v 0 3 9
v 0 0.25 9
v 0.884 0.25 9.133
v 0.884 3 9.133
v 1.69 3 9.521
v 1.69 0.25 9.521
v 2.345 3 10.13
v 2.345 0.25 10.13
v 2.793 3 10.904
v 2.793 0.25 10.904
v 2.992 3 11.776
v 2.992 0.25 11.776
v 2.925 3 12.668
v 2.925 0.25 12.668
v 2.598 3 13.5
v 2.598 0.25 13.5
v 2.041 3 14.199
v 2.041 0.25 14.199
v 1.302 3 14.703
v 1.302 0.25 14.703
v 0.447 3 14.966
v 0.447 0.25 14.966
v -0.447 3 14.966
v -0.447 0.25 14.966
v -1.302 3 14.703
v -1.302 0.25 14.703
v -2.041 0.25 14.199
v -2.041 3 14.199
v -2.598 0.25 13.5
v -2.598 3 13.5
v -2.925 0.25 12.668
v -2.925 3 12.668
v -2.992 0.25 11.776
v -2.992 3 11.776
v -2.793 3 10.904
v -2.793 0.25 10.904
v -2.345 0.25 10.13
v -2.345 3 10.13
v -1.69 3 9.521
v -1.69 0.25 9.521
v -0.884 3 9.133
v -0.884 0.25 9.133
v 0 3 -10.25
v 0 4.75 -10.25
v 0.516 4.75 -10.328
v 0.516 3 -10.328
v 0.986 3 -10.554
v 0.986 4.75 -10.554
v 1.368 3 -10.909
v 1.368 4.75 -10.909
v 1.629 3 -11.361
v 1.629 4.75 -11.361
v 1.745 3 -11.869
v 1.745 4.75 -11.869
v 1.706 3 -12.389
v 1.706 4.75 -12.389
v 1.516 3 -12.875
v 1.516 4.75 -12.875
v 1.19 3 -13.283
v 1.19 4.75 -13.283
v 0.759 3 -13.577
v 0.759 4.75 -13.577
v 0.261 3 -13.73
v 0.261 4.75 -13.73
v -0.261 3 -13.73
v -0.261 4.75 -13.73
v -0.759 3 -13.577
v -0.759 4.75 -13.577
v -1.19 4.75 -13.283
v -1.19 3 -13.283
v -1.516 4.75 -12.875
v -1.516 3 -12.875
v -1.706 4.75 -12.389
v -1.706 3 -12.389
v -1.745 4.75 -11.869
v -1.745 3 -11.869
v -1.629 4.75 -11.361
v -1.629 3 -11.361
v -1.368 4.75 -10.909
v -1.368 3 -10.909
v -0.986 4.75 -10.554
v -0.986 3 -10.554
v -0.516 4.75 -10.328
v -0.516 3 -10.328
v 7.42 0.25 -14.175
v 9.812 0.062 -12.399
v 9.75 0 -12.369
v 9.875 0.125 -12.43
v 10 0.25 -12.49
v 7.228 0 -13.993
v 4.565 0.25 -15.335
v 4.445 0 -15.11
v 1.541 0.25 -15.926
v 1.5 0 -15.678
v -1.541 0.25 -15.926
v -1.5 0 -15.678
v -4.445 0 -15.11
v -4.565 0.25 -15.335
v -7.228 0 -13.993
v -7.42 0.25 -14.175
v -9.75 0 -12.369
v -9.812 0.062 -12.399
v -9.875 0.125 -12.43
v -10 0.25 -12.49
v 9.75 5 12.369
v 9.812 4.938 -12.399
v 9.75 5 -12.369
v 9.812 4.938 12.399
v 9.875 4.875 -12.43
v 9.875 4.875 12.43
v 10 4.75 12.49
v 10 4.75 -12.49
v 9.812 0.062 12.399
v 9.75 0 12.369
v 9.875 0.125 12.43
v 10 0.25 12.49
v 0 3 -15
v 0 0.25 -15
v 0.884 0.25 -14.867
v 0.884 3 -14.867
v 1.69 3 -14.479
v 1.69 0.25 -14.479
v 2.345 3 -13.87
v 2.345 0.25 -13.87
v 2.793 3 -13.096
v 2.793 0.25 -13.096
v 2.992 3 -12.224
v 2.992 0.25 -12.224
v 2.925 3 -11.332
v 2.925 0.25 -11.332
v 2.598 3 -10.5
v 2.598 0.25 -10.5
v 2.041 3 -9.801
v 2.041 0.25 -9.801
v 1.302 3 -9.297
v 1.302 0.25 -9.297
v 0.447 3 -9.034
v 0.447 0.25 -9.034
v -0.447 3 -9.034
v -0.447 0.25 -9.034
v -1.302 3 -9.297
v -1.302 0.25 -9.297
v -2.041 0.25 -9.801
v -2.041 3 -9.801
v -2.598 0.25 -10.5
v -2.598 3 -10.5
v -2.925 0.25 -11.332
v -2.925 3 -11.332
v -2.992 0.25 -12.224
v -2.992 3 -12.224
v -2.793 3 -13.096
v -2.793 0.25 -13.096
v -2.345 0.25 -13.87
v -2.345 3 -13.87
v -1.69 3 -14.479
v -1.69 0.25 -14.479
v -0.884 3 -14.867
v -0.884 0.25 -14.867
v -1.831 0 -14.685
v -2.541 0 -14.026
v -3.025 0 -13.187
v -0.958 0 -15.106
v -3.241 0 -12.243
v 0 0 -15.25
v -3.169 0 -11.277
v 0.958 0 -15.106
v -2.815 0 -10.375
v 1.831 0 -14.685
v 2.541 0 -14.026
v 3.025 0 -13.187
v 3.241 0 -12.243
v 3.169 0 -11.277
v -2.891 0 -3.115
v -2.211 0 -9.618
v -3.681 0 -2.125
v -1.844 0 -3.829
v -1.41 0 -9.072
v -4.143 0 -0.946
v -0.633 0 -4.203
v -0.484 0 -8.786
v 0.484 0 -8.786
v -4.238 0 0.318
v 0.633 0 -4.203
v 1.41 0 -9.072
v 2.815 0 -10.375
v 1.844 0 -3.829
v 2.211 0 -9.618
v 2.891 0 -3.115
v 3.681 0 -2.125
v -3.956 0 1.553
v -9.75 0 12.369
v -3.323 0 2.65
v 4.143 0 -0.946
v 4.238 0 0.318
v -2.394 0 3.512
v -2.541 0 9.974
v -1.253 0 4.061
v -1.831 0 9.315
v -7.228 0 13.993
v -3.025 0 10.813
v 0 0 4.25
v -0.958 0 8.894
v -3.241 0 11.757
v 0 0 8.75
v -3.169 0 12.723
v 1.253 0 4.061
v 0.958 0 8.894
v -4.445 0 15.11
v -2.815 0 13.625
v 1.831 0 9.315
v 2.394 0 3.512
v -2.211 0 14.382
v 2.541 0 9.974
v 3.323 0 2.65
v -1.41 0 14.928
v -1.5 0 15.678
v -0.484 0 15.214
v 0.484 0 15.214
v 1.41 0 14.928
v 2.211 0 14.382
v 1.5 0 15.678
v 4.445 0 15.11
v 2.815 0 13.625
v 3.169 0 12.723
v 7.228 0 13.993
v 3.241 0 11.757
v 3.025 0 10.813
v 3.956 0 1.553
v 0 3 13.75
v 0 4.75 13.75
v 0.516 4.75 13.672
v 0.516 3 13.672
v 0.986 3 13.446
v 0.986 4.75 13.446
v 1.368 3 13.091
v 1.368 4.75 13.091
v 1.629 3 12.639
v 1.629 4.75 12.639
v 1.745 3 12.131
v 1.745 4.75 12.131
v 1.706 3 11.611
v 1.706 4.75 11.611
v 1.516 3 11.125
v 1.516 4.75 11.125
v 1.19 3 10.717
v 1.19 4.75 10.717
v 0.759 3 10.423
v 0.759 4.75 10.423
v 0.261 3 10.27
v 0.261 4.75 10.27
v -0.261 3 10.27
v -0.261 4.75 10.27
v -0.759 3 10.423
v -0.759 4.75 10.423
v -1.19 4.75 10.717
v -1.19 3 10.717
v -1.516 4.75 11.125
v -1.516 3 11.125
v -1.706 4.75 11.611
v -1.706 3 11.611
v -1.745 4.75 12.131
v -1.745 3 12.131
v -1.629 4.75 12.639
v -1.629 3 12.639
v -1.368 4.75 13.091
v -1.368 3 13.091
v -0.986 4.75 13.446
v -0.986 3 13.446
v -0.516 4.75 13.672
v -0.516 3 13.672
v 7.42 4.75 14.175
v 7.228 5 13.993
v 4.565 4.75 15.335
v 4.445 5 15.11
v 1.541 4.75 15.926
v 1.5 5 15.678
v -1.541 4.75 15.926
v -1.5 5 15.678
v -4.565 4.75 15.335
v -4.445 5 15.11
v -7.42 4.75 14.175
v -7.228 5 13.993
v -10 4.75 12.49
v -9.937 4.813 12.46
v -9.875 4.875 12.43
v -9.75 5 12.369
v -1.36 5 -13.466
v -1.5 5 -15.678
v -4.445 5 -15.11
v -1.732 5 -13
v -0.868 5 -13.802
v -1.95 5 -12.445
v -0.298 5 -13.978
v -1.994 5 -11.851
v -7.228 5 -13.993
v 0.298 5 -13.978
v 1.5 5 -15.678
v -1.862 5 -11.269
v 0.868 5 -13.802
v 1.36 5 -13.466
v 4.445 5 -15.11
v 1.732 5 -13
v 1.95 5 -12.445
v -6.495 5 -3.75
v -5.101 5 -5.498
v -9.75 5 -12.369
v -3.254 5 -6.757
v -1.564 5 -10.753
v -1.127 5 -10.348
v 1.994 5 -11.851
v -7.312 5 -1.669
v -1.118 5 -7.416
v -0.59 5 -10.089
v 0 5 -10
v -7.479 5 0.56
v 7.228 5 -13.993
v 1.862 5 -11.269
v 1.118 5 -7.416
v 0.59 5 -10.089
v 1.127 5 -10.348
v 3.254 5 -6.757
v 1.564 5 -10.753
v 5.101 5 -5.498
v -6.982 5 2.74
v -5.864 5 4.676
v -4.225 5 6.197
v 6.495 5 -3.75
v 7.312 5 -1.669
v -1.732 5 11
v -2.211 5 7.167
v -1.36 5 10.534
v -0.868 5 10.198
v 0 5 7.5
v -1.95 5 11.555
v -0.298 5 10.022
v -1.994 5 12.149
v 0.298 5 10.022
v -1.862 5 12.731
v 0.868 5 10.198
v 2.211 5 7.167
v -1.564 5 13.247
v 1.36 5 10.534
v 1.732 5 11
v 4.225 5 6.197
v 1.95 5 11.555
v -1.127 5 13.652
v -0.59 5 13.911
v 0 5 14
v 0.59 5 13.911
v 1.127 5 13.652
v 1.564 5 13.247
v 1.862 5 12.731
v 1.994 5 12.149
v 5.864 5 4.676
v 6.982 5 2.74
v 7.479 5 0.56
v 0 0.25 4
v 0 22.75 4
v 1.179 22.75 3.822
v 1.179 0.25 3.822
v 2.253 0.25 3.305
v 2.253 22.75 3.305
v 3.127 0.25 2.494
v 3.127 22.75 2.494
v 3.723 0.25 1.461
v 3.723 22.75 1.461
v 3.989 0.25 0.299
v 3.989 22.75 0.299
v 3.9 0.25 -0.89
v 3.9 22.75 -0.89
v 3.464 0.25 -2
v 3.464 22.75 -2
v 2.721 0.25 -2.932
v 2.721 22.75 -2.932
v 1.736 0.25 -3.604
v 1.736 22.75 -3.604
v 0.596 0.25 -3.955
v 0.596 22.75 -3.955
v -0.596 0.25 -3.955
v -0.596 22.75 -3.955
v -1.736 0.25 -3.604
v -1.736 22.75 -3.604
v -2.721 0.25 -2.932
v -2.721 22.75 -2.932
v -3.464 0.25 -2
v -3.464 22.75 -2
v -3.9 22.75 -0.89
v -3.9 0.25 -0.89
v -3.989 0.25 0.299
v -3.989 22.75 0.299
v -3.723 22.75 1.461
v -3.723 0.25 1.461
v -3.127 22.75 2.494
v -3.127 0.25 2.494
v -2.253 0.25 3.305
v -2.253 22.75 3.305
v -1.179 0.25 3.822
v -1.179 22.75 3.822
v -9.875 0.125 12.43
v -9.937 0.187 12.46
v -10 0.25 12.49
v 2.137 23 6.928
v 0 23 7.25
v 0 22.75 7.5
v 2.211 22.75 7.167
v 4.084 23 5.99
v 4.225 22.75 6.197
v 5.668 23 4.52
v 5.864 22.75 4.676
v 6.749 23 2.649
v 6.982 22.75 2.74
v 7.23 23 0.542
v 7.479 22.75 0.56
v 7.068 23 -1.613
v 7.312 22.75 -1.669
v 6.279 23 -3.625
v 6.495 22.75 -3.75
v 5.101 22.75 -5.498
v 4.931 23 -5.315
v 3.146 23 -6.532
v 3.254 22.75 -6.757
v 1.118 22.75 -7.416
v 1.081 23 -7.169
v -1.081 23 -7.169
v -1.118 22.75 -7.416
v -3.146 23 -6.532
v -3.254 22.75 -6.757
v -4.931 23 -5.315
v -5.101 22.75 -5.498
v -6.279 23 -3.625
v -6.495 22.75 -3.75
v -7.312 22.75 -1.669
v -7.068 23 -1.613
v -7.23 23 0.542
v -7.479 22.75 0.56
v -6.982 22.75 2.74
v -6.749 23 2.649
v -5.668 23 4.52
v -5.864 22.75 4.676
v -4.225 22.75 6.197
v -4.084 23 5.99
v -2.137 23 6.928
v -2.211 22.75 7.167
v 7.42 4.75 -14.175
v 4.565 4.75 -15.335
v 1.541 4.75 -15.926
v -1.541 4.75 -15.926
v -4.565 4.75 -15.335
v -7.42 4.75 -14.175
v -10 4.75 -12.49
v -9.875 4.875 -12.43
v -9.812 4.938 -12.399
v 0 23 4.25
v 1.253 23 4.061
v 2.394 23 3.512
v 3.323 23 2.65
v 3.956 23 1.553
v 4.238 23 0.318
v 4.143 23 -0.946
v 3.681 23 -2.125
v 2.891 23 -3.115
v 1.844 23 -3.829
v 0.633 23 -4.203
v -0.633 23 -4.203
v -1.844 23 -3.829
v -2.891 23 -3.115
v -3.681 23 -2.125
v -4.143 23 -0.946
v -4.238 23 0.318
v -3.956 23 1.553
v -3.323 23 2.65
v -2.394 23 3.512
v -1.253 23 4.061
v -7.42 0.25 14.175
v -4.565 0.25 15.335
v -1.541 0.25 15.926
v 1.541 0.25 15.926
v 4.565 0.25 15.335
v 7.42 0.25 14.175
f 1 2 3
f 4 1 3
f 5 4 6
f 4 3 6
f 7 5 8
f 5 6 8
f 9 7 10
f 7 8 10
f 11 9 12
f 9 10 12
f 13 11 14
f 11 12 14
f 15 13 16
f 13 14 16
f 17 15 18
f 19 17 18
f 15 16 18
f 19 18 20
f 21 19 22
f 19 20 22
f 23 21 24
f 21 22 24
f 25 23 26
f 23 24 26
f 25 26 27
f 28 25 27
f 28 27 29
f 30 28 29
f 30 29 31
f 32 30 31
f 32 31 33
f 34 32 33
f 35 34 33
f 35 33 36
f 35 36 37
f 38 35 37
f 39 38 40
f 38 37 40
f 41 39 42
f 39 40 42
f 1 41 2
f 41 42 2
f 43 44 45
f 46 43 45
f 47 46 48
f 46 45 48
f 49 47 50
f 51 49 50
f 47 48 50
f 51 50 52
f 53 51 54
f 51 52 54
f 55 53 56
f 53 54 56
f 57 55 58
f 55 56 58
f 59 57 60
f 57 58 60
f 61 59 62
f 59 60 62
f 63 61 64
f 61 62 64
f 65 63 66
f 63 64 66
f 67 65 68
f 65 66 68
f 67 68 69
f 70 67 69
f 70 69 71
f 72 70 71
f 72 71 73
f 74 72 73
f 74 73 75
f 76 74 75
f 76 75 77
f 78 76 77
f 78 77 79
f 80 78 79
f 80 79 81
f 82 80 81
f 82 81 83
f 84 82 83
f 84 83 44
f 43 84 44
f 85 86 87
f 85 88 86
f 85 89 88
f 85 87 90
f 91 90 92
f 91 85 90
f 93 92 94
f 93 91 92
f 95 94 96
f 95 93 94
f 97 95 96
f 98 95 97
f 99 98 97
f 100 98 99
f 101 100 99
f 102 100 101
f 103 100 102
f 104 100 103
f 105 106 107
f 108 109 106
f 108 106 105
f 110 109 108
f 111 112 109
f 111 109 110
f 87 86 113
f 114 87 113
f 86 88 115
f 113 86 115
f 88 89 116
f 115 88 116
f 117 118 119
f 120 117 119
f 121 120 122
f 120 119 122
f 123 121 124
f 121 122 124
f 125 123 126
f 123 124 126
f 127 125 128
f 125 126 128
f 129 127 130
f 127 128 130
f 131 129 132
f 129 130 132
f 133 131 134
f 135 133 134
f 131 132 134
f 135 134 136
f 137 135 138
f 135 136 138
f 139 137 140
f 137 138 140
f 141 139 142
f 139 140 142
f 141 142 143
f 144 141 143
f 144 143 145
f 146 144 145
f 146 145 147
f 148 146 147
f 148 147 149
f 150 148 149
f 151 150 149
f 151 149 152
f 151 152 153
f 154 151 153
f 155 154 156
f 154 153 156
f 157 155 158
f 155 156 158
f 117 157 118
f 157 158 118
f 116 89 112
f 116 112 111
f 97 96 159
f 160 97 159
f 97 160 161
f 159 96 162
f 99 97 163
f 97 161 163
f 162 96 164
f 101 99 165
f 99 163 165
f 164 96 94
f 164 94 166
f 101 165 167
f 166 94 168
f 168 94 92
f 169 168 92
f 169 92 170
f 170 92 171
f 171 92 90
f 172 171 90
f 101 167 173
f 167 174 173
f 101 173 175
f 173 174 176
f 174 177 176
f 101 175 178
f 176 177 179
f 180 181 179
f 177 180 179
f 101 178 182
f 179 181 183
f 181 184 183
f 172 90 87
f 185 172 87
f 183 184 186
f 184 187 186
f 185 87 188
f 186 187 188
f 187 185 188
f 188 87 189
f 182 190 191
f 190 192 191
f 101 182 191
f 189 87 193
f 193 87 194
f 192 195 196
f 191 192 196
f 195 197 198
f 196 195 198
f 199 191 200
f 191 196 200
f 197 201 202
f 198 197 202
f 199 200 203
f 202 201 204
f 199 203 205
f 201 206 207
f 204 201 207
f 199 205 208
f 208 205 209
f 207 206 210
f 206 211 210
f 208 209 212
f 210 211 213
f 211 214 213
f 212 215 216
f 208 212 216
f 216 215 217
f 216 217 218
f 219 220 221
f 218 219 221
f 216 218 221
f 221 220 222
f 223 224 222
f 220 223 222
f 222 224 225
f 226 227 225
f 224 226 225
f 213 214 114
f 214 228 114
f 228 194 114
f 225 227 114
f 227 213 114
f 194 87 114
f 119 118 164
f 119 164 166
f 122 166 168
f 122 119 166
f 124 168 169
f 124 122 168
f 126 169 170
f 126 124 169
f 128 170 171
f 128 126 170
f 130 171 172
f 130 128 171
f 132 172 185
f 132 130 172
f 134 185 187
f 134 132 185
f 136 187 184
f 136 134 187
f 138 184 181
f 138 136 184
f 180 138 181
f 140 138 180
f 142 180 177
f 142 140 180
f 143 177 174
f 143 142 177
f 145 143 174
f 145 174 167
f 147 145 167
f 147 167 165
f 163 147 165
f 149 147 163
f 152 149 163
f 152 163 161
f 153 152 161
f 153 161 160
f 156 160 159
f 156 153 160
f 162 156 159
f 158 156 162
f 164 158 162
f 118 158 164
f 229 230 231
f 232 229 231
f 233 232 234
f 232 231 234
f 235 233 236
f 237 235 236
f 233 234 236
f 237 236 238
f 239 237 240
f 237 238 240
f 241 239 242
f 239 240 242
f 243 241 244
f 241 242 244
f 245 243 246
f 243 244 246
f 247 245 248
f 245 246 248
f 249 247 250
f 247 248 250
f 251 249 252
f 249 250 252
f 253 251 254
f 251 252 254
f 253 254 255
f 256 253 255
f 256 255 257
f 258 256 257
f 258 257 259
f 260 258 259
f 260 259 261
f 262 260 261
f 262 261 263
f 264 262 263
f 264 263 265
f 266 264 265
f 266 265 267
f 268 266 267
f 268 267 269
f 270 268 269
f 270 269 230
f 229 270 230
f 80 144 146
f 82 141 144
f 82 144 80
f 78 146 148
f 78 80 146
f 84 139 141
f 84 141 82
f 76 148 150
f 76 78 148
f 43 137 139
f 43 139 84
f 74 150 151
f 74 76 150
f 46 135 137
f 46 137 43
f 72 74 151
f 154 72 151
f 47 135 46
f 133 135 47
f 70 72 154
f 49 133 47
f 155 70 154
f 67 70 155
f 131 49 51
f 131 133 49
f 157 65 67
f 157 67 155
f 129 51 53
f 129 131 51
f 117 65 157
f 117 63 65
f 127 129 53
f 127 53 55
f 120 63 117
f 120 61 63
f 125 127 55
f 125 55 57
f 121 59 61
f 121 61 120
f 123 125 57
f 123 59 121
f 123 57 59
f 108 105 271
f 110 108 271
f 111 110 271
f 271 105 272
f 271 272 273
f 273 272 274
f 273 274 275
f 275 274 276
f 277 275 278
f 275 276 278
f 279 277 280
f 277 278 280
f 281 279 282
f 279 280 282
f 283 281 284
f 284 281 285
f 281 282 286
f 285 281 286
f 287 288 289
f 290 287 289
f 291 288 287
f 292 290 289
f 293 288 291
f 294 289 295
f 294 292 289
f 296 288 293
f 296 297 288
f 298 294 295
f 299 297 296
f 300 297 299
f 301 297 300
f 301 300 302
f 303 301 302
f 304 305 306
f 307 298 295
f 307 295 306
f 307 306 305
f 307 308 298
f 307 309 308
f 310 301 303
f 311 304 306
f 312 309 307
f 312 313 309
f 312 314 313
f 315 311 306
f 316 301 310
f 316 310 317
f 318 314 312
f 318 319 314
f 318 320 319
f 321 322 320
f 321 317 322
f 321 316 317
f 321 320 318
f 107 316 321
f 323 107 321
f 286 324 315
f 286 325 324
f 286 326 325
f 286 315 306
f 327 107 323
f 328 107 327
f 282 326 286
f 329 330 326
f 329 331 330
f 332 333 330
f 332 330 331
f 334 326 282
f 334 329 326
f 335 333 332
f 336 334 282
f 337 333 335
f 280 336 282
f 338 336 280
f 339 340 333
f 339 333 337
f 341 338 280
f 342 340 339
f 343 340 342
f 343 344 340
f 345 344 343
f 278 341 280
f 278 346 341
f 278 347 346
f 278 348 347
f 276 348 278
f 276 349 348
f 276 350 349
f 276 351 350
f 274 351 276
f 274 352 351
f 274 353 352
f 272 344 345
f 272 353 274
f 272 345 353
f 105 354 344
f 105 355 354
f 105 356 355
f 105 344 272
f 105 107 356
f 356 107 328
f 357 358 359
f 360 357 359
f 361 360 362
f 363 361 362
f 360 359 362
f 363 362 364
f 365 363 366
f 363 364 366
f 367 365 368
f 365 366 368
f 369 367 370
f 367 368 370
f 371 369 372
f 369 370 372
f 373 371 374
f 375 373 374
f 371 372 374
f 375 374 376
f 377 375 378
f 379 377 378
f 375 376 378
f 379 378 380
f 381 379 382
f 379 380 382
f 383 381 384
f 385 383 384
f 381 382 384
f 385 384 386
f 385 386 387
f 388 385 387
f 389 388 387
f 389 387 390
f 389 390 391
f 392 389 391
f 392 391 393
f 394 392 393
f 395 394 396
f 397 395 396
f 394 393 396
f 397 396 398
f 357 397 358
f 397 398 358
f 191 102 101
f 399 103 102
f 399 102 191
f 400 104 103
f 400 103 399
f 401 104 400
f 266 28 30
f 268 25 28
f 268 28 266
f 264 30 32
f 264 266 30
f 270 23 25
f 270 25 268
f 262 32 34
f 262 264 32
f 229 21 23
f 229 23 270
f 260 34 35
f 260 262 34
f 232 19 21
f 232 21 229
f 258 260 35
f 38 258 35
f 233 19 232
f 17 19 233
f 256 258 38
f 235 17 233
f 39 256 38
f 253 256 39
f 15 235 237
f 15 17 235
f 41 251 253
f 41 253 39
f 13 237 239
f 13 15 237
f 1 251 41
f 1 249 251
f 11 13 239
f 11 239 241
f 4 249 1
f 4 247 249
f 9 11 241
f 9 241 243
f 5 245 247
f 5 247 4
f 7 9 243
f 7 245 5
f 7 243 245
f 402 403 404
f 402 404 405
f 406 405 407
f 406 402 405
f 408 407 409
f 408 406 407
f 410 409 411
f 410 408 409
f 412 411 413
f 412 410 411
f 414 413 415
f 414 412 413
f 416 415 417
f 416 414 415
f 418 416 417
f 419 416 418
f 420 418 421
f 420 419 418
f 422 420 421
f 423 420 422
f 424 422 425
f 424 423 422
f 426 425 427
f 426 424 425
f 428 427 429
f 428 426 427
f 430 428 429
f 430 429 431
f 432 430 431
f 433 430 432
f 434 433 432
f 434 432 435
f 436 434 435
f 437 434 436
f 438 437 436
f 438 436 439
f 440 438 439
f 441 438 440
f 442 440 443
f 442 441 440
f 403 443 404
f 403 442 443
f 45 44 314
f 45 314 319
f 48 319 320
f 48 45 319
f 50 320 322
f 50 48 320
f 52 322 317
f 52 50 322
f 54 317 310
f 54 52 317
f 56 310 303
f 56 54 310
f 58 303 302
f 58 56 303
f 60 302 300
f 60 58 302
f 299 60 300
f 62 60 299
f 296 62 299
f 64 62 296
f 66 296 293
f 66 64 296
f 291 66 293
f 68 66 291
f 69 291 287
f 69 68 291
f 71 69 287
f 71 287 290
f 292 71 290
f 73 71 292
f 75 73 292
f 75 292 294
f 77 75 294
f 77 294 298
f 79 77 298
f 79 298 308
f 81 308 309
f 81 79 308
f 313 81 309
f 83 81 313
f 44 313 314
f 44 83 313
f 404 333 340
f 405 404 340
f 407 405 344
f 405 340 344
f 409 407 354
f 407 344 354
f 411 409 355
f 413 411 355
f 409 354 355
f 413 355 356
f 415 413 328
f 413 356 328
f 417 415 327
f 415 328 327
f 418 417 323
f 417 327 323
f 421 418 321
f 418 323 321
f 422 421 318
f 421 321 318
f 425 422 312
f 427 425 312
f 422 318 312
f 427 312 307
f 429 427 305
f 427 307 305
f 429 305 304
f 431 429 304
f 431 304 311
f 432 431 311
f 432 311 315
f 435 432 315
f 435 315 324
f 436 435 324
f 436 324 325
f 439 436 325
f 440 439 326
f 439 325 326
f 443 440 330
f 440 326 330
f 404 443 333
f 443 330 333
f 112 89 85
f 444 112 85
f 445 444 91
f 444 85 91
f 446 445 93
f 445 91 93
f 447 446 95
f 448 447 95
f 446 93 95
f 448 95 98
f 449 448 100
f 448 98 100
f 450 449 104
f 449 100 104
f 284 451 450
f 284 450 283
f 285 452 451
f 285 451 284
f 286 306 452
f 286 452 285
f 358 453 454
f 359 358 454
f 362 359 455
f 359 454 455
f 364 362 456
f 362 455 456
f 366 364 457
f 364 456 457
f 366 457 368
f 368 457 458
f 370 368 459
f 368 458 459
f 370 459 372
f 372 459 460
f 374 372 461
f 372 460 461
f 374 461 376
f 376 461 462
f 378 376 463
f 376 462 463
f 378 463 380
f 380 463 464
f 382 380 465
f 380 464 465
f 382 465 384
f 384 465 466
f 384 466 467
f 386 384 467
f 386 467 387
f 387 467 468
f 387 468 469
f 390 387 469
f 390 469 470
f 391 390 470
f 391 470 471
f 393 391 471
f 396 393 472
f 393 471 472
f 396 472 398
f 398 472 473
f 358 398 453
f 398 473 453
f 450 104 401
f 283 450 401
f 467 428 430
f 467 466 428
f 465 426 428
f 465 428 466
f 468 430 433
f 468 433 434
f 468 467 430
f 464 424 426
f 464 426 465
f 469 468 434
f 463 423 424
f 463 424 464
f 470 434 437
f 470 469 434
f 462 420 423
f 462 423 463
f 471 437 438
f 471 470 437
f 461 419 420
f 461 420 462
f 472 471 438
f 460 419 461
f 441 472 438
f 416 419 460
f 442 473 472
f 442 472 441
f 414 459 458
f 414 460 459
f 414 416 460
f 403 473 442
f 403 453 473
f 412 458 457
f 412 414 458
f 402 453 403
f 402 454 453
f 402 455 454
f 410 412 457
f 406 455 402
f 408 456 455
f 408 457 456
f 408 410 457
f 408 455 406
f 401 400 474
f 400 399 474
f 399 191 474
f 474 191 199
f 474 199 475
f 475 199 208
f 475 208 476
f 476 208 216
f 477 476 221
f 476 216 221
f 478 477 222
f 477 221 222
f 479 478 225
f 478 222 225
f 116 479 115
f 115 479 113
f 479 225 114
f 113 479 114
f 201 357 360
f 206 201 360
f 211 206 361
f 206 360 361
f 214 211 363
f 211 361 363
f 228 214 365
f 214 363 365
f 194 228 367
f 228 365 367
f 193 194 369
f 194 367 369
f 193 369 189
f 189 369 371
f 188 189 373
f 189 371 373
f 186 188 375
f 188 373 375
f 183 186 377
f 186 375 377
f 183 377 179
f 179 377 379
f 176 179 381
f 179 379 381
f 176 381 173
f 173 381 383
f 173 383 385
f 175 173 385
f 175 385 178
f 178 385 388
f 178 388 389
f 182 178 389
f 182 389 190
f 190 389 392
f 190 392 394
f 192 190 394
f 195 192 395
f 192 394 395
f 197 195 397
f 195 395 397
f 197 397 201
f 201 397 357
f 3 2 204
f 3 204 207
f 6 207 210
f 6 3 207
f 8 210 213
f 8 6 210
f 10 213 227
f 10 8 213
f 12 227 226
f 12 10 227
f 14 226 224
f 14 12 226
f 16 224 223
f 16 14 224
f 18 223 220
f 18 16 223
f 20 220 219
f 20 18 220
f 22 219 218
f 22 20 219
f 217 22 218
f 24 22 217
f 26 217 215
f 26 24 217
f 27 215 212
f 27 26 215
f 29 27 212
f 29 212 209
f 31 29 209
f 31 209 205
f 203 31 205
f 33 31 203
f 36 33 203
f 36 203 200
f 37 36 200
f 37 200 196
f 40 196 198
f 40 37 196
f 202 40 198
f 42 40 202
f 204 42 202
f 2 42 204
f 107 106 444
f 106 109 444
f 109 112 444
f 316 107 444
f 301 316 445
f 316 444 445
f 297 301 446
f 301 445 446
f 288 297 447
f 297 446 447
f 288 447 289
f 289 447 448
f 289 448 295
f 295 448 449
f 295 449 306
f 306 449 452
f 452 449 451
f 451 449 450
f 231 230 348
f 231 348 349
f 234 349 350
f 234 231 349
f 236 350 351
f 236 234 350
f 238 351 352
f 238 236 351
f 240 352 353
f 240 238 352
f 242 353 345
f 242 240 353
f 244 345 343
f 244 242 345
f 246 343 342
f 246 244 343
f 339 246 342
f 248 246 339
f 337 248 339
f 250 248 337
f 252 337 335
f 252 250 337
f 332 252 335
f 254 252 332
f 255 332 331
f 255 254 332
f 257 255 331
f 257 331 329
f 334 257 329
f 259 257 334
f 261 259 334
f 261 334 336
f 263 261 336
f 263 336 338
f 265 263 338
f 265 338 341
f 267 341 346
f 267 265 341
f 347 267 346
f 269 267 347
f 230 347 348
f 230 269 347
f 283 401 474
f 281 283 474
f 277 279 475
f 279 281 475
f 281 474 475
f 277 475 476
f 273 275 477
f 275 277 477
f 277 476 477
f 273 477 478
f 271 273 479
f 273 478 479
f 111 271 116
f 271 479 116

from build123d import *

# Parameters (mm, degrees)
SKETCH1_R           = 16
BOSS_EXTRUDE1_DEPTH = 5
CUT_EXTRUDE1_DEPTH  = 5
SKETCH3_R           = 7.5
BOSS_EXTRUDE2_DEPTH = 18
SKETCH4_R           = 4
CUT_EXTRUDE2_DEPTH  = 23
SKETCH5_R           = 1.75
CUT_EXTRUDE3_DEPTH  = 5
SKETCH6_R           = 3
CUT_EXTRUDE4_DEPTH  = 3
CHAMFER1_SIZE       = 0.25


with BuildPart() as part:
    # Sketch1 → Boss-Extrude1 (new body)
    with BuildSketch(Plane(origin=(0, 0, 0), x_dir=(1, 0, 0), z_dir=(0, 1, 0))):
        with Locations(Location((0, 0, 0), (0, 0, 270))):
            Circle(SKETCH1_R)
    extrude(amount=BOSS_EXTRUDE1_DEPTH)

    # Sketch2 → Cut-Extrude1 (cut)
    with BuildSketch(Plane(origin=(0, 0, 0), x_dir=(1, 0, 0), z_dir=(0, 1, 0))):
        with BuildLine():
            Line((-10, 12.489995997), (-10, -12.489995997))
            ThreePointArc((-10, -12.489995997), (-16, 0), (-10, 12.489995997))
        make_face()
        with BuildLine():
            Line((10, 12.489995997), (10, -12.489995997))
            ThreePointArc((10, -12.489995997), (16, 0), (10, 12.489995997))
        make_face()
    extrude(amount=CUT_EXTRUDE1_DEPTH, mode=Mode.SUBTRACT)

    # Sketch3 → Boss-Extrude2 (add)
    with BuildSketch(Plane(origin=(0, 5, 0), x_dir=(1, 0, 0), z_dir=(0, 1, 0))):
        with Locations(Location((0, 0, 0), (0, 0, 270))):
            Circle(SKETCH3_R)
    extrude(amount=BOSS_EXTRUDE2_DEPTH)

    # Sketch4 → Cut-Extrude2 (cut)
    with BuildSketch(Plane(origin=(0, 23, 0), x_dir=(1, 0, 0), z_dir=(0, 1, 0))):
        with Locations(Location((0, 0, 0), (0, 0, 270))):
            Circle(SKETCH4_R)
    extrude(amount=-CUT_EXTRUDE2_DEPTH, mode=Mode.SUBTRACT)

    # Sketch5 → Cut-Extrude3 (cut)
    with BuildSketch(Plane(origin=(0, 5, 0), x_dir=(1, 0, 0), z_dir=(0, 1, 0))):
        with Locations(Location((0, 12, 0), (0, 0, 270))):
            Circle(SKETCH5_R)
        with Locations(Location((0, -12, 0), (0, 0, 270))):
            Circle(SKETCH5_R)
    extrude(amount=-CUT_EXTRUDE3_DEPTH, mode=Mode.SUBTRACT)

    # Sketch6 → Cut-Extrude4 (cut)
    with BuildSketch(Plane.XZ):
        with Locations(Location((0, 12, 0), (0, 0, 270))):
            Circle(SKETCH6_R)
        with Locations(Location((0, -12, 0), (0, 0, 270))):
            Circle(SKETCH6_R)
    extrude(amount=-CUT_EXTRUDE4_DEPTH, mode=Mode.SUBTRACT)

    # Chamfer1
    chamfer1_edges = [part.edges().sort_by_distance(p)[0] for p in [
        (0, 0, -16),
        (0, 5, -16),
        (10, 0, 0),
        (10, 5, 0),
        (0, 23, -7.5),
        (0, 0, -4),
        (0, 23, -4),
        (0, 5, -13.75),
        (0, 5, 10.25),
        (0, 0, 15),
        (0, 0, -9),
        (0, 0, 16),
        (0, 5, 16),
        (-10, 0, 0),
        (-10, 5, 0),
    ]]
    chamfer(chamfer1_edges, length=CHAMFER1_SIZE)


solid = part.part
